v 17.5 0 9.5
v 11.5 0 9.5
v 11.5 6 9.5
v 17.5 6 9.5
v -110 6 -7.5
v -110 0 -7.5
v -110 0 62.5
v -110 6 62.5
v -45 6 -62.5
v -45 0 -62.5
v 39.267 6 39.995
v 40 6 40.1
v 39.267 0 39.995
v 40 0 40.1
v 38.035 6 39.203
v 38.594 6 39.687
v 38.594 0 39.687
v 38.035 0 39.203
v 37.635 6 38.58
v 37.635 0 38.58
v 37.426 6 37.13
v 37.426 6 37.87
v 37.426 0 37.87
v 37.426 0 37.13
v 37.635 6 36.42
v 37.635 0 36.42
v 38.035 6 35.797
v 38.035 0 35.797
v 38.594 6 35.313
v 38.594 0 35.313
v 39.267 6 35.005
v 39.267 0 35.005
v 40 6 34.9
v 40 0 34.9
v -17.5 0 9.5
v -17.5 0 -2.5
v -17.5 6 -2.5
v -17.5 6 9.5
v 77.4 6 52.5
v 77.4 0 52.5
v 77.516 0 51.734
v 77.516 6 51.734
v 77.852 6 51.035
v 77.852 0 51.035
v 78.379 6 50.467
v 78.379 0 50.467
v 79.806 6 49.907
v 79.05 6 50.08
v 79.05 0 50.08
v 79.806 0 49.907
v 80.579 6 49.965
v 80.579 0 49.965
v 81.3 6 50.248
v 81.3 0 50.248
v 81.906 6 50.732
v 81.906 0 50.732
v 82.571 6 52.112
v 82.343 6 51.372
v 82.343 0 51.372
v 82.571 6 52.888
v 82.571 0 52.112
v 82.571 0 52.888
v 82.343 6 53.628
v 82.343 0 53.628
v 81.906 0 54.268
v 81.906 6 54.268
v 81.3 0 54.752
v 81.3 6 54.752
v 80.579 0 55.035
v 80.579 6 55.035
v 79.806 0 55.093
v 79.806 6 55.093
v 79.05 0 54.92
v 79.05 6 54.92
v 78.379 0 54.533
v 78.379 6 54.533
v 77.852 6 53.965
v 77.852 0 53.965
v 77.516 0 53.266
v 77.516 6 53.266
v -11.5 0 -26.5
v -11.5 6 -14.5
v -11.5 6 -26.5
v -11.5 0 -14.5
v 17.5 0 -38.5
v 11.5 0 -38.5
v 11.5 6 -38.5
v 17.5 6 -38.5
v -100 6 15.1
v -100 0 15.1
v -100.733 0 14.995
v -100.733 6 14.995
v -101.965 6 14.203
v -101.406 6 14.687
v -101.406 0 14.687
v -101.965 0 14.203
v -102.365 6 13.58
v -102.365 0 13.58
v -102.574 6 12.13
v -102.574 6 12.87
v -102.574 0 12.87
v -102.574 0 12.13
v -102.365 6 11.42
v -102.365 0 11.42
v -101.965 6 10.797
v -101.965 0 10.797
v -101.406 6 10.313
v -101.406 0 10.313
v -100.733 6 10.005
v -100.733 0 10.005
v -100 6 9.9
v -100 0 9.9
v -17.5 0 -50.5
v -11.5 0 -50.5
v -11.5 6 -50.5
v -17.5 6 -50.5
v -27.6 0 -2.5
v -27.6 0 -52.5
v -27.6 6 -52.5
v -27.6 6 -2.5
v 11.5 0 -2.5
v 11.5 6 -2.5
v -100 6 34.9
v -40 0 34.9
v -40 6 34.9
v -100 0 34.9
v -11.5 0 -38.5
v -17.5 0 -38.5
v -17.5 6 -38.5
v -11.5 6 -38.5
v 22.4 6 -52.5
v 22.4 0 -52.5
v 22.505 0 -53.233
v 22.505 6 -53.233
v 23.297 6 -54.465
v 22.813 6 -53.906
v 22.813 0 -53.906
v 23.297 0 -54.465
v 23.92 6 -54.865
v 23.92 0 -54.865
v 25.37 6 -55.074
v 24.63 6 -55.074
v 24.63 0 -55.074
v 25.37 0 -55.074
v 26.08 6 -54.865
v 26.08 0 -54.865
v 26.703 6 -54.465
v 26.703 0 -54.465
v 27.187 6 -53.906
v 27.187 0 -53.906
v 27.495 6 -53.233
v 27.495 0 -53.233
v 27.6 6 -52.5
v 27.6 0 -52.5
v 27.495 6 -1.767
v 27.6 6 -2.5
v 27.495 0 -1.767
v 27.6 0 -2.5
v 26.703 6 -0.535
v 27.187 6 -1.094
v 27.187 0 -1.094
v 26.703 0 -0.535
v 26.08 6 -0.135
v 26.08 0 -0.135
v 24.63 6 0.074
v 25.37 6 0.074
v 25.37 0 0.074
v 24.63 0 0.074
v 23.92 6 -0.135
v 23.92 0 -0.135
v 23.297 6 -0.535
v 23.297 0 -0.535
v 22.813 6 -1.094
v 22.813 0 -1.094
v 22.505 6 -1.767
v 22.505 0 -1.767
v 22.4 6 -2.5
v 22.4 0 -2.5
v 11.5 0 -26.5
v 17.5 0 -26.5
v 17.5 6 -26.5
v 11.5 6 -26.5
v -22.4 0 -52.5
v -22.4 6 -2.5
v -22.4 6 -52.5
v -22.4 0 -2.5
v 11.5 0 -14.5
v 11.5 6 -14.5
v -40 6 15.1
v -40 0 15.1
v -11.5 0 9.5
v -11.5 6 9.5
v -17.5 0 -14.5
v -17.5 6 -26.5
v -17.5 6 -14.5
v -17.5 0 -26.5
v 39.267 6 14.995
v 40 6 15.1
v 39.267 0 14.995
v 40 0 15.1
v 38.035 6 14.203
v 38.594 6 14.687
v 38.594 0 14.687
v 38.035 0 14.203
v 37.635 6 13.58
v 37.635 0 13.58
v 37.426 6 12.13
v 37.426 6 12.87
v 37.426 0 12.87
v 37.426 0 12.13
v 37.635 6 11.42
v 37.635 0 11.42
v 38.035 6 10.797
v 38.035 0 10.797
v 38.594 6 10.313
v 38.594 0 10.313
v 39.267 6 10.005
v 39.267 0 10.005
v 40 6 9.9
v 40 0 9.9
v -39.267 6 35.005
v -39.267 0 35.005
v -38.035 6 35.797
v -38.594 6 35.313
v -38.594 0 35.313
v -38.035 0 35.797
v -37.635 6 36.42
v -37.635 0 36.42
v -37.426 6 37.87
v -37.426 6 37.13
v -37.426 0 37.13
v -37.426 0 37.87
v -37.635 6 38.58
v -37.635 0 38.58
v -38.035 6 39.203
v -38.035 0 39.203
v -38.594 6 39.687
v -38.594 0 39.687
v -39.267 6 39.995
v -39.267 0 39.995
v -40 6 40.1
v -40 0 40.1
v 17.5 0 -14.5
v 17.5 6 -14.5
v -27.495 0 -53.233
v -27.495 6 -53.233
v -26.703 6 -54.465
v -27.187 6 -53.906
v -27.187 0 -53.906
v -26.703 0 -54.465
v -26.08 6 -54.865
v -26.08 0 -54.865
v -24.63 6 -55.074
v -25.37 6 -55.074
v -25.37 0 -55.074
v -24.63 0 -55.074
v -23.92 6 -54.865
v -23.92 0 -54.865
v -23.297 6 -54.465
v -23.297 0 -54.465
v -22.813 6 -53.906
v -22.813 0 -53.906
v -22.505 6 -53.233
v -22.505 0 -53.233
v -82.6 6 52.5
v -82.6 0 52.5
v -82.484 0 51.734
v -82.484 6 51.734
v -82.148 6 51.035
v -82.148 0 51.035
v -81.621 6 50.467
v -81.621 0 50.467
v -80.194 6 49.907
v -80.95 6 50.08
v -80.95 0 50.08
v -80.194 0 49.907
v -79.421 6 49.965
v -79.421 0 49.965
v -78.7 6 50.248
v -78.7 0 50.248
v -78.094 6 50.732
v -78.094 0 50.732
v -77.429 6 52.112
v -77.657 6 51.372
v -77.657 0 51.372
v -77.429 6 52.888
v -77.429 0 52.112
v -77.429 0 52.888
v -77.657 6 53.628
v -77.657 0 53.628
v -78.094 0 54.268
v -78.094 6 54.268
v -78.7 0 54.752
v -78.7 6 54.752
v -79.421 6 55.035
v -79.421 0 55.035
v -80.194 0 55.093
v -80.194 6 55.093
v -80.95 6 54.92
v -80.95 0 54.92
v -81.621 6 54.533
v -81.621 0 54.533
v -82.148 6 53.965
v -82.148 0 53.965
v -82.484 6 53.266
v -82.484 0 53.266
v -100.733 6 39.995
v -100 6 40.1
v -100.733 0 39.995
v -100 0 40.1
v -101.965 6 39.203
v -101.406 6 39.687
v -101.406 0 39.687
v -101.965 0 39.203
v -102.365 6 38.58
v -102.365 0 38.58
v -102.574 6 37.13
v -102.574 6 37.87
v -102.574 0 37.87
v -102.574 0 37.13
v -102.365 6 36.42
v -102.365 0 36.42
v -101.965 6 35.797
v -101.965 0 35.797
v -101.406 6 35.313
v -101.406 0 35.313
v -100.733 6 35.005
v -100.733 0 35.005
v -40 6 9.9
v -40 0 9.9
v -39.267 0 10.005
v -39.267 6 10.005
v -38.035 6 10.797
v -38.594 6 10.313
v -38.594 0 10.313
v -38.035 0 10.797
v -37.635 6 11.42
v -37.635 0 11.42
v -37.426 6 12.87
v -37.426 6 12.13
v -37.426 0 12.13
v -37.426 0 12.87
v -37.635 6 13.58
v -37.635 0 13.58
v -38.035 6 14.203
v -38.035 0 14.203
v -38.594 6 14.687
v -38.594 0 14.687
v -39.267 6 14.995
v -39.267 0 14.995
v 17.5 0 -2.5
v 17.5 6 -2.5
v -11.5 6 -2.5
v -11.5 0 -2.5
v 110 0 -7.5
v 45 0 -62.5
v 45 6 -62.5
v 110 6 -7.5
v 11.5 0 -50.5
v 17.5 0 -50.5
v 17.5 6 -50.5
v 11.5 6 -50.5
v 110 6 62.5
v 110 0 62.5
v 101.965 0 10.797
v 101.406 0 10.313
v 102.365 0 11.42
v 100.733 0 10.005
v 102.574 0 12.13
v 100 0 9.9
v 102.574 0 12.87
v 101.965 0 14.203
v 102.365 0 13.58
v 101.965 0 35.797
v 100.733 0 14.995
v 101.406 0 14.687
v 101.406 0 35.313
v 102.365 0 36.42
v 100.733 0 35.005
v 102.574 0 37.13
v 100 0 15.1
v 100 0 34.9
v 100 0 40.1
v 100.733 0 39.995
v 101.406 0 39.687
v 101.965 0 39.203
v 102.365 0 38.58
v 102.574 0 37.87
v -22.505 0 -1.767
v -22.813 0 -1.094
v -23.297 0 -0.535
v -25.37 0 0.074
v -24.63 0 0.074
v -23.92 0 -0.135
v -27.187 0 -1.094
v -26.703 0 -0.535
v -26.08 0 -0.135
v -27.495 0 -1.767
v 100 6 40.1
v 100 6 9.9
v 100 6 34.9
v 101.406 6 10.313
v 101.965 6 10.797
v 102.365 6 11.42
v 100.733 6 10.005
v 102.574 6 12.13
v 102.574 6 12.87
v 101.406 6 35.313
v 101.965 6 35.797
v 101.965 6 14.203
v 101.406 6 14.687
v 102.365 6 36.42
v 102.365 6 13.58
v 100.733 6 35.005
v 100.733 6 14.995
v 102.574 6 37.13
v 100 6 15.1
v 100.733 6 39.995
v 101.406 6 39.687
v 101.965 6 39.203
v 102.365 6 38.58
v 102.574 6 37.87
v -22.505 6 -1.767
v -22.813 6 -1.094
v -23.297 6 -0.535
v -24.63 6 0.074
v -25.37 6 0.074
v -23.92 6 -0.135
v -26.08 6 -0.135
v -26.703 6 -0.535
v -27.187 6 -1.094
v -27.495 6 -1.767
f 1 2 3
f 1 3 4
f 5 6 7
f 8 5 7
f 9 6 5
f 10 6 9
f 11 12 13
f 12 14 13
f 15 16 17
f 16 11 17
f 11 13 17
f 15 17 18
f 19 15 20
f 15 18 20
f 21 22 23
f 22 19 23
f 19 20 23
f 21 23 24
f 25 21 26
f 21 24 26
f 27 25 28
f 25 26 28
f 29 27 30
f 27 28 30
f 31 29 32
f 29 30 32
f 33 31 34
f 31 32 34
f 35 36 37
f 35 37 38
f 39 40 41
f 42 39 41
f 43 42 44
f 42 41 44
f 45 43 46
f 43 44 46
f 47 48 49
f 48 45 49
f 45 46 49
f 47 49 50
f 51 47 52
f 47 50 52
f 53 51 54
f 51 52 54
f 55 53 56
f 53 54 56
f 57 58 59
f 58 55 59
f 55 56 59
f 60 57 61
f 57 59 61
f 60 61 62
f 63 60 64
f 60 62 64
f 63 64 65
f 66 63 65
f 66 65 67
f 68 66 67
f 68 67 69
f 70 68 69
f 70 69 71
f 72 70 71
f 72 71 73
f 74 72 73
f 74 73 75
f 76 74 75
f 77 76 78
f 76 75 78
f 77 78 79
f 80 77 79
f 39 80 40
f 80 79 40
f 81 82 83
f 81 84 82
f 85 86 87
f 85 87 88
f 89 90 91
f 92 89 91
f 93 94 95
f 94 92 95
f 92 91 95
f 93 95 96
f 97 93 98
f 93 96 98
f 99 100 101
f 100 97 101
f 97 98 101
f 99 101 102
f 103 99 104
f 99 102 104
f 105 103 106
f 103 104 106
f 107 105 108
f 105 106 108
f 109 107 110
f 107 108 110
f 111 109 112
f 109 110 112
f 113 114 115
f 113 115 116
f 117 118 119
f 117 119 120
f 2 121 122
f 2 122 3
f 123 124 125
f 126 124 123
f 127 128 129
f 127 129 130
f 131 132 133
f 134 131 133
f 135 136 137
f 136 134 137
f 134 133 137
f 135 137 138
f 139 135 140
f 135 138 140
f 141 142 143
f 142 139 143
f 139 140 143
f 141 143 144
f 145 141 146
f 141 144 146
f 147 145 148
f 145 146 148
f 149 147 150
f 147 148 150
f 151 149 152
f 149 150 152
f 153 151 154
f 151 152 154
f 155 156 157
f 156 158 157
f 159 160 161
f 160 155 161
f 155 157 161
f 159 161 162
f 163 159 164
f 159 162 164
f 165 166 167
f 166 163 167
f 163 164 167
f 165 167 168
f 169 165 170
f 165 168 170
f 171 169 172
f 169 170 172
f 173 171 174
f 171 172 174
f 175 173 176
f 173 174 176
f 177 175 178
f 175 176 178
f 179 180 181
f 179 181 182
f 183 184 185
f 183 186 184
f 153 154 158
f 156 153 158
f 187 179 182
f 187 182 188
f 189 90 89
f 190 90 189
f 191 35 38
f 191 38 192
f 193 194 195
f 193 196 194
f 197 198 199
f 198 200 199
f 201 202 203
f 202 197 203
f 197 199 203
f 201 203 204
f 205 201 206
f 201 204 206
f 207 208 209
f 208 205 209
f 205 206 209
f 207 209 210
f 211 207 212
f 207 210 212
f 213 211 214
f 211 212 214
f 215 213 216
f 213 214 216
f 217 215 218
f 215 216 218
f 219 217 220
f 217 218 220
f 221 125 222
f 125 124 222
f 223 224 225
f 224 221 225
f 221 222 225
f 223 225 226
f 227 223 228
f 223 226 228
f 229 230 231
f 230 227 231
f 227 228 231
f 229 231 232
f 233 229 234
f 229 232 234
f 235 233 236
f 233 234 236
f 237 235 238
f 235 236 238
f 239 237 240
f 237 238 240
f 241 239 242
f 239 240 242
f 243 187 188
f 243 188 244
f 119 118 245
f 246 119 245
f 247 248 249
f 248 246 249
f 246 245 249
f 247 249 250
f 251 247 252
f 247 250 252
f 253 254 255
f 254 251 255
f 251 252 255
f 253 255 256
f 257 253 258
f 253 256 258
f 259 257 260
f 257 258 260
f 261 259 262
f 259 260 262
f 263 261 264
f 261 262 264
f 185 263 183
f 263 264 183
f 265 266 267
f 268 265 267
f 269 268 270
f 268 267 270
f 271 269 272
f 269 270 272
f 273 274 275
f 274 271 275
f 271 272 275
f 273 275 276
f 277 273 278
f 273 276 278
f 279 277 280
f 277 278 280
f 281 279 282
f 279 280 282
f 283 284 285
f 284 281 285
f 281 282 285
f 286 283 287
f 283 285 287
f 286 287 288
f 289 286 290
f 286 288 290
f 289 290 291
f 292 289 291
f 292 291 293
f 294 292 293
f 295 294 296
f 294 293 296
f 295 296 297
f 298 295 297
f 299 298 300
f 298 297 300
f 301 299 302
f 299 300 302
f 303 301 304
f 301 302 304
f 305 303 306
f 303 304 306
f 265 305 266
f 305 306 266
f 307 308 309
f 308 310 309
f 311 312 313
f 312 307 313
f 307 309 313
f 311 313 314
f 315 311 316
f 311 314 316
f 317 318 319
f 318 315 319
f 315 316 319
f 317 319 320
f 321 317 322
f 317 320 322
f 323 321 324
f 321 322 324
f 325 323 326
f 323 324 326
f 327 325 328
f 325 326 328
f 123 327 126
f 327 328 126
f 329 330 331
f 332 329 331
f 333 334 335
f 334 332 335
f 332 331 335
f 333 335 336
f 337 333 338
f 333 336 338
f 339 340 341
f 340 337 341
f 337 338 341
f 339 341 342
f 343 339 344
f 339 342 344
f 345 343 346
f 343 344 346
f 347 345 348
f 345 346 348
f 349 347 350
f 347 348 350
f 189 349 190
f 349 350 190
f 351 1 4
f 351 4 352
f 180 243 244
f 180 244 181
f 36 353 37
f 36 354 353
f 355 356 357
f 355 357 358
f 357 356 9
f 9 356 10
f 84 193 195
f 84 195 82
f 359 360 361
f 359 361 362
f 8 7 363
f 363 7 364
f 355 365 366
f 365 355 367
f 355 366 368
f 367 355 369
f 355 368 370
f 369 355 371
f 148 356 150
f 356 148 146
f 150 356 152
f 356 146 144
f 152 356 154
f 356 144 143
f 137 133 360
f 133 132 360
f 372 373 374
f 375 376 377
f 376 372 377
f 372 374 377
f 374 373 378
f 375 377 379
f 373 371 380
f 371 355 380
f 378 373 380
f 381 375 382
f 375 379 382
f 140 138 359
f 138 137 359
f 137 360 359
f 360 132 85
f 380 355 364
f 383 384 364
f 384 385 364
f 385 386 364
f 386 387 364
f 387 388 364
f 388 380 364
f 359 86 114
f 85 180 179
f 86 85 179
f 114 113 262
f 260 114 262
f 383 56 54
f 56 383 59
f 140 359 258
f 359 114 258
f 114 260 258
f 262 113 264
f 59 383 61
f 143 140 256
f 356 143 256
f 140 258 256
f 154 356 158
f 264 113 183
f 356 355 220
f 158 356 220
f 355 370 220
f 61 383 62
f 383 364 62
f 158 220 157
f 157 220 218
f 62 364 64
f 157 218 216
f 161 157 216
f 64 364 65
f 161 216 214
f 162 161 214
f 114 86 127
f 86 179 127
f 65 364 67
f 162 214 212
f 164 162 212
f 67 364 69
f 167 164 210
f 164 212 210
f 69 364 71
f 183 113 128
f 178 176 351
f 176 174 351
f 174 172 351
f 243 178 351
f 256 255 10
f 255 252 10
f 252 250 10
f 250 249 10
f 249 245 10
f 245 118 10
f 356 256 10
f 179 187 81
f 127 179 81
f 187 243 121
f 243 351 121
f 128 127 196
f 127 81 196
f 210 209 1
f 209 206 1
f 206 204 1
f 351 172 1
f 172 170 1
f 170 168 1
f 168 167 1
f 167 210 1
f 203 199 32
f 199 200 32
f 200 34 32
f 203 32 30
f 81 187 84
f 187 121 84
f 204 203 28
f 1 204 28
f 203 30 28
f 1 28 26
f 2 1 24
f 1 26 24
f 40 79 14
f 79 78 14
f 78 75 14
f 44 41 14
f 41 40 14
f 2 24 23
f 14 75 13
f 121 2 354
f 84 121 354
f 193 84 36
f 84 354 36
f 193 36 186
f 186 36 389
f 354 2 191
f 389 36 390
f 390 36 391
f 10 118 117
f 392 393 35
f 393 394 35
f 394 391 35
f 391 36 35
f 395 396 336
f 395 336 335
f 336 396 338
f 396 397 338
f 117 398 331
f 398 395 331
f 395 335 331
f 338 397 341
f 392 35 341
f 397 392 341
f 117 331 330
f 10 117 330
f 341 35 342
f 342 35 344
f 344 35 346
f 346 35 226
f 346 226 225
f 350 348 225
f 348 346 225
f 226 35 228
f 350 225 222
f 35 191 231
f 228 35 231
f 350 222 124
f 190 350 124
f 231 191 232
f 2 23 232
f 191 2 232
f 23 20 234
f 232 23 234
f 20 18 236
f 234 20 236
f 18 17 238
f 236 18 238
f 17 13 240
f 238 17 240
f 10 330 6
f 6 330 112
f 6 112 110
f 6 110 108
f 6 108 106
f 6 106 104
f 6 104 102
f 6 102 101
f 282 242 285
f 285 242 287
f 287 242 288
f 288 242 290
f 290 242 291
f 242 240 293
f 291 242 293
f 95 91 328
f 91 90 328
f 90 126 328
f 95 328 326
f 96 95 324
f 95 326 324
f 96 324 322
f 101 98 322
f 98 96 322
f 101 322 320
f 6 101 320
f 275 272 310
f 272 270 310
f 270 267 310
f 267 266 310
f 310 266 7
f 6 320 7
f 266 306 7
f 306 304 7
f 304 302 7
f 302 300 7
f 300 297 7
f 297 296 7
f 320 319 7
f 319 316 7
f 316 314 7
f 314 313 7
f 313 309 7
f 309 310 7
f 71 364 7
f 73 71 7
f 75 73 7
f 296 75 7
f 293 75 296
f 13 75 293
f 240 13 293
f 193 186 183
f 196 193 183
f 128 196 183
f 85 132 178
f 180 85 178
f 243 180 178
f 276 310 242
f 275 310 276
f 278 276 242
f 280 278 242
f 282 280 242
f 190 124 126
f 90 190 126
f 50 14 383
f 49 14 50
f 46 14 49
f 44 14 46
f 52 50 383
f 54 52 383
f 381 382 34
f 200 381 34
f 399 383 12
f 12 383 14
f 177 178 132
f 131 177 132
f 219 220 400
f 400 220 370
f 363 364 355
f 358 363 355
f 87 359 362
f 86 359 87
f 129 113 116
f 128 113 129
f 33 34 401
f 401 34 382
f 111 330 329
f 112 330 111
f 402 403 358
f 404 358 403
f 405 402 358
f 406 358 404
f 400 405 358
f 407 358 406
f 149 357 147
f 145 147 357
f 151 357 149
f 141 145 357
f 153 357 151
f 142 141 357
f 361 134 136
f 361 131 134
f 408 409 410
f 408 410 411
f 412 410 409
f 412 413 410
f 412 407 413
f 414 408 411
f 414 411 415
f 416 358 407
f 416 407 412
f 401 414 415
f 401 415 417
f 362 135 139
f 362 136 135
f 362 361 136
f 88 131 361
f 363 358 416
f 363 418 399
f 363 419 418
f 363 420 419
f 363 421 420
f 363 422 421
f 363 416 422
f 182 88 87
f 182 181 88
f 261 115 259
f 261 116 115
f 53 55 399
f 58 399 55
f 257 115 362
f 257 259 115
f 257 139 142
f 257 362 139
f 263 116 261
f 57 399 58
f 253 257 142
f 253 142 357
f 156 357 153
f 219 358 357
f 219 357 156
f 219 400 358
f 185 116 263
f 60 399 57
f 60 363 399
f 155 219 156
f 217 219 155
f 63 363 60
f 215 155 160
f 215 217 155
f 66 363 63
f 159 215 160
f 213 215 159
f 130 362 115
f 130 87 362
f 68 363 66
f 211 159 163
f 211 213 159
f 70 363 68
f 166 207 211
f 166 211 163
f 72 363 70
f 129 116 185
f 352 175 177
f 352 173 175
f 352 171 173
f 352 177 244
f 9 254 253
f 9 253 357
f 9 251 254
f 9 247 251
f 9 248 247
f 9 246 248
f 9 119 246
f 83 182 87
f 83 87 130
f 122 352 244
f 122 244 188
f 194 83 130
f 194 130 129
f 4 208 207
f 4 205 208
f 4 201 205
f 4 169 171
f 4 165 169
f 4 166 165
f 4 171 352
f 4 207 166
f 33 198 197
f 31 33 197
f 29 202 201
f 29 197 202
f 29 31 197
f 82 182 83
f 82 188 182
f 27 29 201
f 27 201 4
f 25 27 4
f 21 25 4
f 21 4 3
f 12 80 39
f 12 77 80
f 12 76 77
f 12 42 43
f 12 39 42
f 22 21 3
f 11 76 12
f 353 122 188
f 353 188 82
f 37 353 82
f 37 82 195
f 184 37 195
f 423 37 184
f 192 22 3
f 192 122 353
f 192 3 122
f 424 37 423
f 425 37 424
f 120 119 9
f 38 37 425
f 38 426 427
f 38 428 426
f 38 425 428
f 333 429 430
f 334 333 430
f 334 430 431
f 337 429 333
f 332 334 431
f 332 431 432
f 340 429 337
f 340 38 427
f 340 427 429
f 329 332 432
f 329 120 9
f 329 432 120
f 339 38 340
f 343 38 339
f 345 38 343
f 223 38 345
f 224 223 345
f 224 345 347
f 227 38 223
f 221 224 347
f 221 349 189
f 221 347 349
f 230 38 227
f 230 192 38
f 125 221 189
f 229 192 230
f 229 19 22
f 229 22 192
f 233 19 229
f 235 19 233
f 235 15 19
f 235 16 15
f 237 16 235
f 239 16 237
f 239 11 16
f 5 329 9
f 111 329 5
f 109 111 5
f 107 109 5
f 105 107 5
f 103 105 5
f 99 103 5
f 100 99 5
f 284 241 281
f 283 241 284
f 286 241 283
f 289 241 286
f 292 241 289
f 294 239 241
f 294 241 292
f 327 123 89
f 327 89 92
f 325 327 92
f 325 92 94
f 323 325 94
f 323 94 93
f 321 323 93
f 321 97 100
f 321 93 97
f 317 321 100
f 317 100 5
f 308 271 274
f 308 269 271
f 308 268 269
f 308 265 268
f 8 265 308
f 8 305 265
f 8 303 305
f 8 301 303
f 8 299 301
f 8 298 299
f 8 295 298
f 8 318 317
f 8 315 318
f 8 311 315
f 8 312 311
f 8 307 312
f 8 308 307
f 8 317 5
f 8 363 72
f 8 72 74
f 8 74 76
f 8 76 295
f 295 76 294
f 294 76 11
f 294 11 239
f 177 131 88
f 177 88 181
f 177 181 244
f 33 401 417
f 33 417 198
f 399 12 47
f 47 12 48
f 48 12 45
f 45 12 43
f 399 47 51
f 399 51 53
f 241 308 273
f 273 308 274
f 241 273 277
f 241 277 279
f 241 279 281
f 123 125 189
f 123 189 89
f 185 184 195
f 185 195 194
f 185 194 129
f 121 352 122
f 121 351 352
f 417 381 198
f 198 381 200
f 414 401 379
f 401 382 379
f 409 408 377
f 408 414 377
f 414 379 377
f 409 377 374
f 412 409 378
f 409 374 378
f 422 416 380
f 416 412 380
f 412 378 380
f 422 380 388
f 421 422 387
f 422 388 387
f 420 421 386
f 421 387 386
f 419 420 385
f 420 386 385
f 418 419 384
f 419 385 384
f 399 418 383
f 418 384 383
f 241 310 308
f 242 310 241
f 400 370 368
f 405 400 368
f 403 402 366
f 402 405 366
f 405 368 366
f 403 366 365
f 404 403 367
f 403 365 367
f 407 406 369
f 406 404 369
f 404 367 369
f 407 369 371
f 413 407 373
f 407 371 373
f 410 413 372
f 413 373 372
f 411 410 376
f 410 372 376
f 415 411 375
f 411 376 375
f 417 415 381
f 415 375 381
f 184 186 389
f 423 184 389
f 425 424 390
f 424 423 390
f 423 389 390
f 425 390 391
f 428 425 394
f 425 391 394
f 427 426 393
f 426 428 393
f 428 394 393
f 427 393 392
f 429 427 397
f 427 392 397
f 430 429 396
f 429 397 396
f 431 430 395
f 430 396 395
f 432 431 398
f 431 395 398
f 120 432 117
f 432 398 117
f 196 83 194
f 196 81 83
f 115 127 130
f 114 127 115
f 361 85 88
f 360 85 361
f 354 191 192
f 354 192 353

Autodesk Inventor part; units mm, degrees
ref_plane "YZ Plane" through (0, 0, 0) normal (1, 0, 0) x (0, 1, 0)
ref_plane "XZ Plane" through (0, 0, 0) normal (0, 1, 0) x (-1, 0, 0)
ref_plane "XY Plane" through (0, 0, 0) normal (0, 0, 1) x (1, 0, 0)
sketch "Sketch2" plane through (0, 0, 0) normal (0, 1, 0) x (-1, 0, 0)
  line L0 (110, 62.5) -> (-110, 62.5)
  line L1 (-110, 62.5) -> (-110, -62.5)
  line L2 (-110, -62.5) -> (110, -62.5)
  line L3 (110, -62.5) -> (110, 62.5)
  line L4 (110, 62.5) -> (-110, -62.5) construction
  line L5 (-110, 62.5) -> (110, -62.5) construction
  line L6 (11.5, -50.5) -> (17.5, -50.5)
  line L7 (17.5, -50.5) -> (17.5, -38.5)
  line L8 (17.5, -38.5) -> (11.5, -38.5)
  line L9 (11.5, -38.5) -> (11.5, -50.5)
  line L10 (11.5, -26.5) -> (17.5, -26.5)
  line L11 (17.5, -26.5) -> (17.5, -14.5)
  line L12 (17.5, -14.5) -> (11.5, -14.5)
  line L13 (11.5, -14.5) -> (11.5, -26.5)
  line L14 (11.5, -2.5) -> (17.5, -2.5)
  line L15 (17.5, -2.5) -> (17.5, 9.5)
  line L16 (17.5, 9.5) -> (11.5, 9.5)
  line L17 (11.5, 9.5) -> (11.5, -2.5)
  line L18 (-17.5, -50.5) -> (-11.5, -50.5)
  line L19 (-11.5, -50.5) -> (-11.5, -38.5)
  line L20 (-11.5, -38.5) -> (-17.5, -38.5)
  line L21 (-17.5, -38.5) -> (-17.5, -50.5)
  line L22 (-17.5, -26.5) -> (-11.5, -26.5)
  line L23 (-11.5, -26.5) -> (-11.5, -14.5)
  line L24 (-11.5, -14.5) -> (-17.5, -14.5)
  line L25 (-17.5, -14.5) -> (-17.5, -26.5)
  line L26 (-17.5, -2.5) -> (-11.5, -2.5)
  line L27 (-11.5, -2.5) -> (-11.5, 9.5)
  line L28 (-11.5, 9.5) -> (-17.5, 9.5)
  line L29 (-17.5, 9.5) -> (-17.5, -2.5)
  line L30 (0, 0) -> (0, -18.9718)
  line L31 (25, -2.5) -> (25, -52.5) construction
  line L32 (22.4, -2.5) -> (22.4, -52.5)
  line L33 (27.6, -52.5) -> (27.6, -2.5)
  arc A0 (27.6, -2.5) -> (22.4, -2.5) centre (25, -2.5) ccw
  arc A1 (22.4, -52.5) -> (27.6, -52.5) centre (25, -52.5) ccw
  line L34 (100, 12.5) -> (40, 12.5) construction
  line L35 (100, 15.1) -> (40, 15.1)
  line L36 (40, 9.9) -> (100, 9.9)
  arc A2 (100, 9.9) -> (100, 15.1) centre (100, 12.5) ccw
  arc A3 (40, 15.1) -> (40, 9.9) centre (40, 12.5) ccw
  line L37 (100, 37.5) -> (40, 37.5) construction
  line L38 (100, 40.1) -> (40, 40.1)
  line L39 (40, 34.9) -> (100, 34.9)
  arc A4 (100, 34.9) -> (100, 40.1) centre (100, 37.5) ccw
  arc A5 (40, 40.1) -> (40, 34.9) centre (40, 37.5) ccw
  line L40 (-25, -2.5) -> (-25, -52.5) construction
  line L41 (-22.4, -2.5) -> (-22.4, -52.5)
  line L42 (-27.6, -52.5) -> (-27.6, -2.5)
  arc A6 (-22.4, -2.5) -> (-27.6, -2.5) centre (-25, -2.5) ccw
  arc A7 (-27.6, -52.5) -> (-22.4, -52.5) centre (-25, -52.5) ccw
  line L43 (-100, 12.5) -> (-40, 12.5) construction
  line L44 (-100, 15.1) -> (-40, 15.1)
  line L45 (-40, 9.9) -> (-100, 9.9)
  arc A8 (-100, 15.1) -> (-100, 9.9) centre (-100, 12.5) ccw
  arc A9 (-40, 9.9) -> (-40, 15.1) centre (-40, 12.5) ccw
  line L46 (-100, 37.5) -> (-40, 37.5) construction
  line L47 (-100, 40.1) -> (-40, 40.1)
  line L48 (-40, 34.9) -> (-100, 34.9)
  arc A10 (-100, 40.1) -> (-100, 34.9) centre (-100, 37.5) ccw
  arc A11 (-40, 34.9) -> (-40, 40.1) centre (-40, 37.5) ccw
  circle A12 centre (80, 52.5) radius 2.6
  circle A13 centre (-80, 52.5) radius 2.6
  line L49 (110, -7.5) -> (45, -62.5)
  line L50 (-45, -62.5) -> (-110, -7.5)
  point P0 (25, -27.5)
  point P1 (70, 12.5)
  point P2 (70, 37.5)
  point P3 (-25, -27.5)
  point P4 (-70, 12.5)
  point P5 (-70, 37.5)
  dimension "d52" = 220
  dimension "d53" = 125
  dimension "d54" = 12
  dimension "d55" = 6
  dimension "d58" = 24
  dimension "d61" = 29
  dimension "d65" = 12
  dimension "d66" = 5.2
  dimension "d68" = 100
  dimension "d69" = 115
  dimension "d70" = 40
  dimension "d71" = 65
  dimension "d72" = 15
  dimension "d73" = 25
  dimension "d75" = 15
  dimension "d76" = 5.2
  dimension "d79" = 30
  dimension "d80" = 10
  dimension "d81" = 20
  dimension "d82" = 20
extrude "Extrusion2" add sketch "Sketch2" along normal blind 6 contours L3 L49 L2 L50 L1 L0
properties part number "phone_holder_back" material "Acrylic, Clear"
